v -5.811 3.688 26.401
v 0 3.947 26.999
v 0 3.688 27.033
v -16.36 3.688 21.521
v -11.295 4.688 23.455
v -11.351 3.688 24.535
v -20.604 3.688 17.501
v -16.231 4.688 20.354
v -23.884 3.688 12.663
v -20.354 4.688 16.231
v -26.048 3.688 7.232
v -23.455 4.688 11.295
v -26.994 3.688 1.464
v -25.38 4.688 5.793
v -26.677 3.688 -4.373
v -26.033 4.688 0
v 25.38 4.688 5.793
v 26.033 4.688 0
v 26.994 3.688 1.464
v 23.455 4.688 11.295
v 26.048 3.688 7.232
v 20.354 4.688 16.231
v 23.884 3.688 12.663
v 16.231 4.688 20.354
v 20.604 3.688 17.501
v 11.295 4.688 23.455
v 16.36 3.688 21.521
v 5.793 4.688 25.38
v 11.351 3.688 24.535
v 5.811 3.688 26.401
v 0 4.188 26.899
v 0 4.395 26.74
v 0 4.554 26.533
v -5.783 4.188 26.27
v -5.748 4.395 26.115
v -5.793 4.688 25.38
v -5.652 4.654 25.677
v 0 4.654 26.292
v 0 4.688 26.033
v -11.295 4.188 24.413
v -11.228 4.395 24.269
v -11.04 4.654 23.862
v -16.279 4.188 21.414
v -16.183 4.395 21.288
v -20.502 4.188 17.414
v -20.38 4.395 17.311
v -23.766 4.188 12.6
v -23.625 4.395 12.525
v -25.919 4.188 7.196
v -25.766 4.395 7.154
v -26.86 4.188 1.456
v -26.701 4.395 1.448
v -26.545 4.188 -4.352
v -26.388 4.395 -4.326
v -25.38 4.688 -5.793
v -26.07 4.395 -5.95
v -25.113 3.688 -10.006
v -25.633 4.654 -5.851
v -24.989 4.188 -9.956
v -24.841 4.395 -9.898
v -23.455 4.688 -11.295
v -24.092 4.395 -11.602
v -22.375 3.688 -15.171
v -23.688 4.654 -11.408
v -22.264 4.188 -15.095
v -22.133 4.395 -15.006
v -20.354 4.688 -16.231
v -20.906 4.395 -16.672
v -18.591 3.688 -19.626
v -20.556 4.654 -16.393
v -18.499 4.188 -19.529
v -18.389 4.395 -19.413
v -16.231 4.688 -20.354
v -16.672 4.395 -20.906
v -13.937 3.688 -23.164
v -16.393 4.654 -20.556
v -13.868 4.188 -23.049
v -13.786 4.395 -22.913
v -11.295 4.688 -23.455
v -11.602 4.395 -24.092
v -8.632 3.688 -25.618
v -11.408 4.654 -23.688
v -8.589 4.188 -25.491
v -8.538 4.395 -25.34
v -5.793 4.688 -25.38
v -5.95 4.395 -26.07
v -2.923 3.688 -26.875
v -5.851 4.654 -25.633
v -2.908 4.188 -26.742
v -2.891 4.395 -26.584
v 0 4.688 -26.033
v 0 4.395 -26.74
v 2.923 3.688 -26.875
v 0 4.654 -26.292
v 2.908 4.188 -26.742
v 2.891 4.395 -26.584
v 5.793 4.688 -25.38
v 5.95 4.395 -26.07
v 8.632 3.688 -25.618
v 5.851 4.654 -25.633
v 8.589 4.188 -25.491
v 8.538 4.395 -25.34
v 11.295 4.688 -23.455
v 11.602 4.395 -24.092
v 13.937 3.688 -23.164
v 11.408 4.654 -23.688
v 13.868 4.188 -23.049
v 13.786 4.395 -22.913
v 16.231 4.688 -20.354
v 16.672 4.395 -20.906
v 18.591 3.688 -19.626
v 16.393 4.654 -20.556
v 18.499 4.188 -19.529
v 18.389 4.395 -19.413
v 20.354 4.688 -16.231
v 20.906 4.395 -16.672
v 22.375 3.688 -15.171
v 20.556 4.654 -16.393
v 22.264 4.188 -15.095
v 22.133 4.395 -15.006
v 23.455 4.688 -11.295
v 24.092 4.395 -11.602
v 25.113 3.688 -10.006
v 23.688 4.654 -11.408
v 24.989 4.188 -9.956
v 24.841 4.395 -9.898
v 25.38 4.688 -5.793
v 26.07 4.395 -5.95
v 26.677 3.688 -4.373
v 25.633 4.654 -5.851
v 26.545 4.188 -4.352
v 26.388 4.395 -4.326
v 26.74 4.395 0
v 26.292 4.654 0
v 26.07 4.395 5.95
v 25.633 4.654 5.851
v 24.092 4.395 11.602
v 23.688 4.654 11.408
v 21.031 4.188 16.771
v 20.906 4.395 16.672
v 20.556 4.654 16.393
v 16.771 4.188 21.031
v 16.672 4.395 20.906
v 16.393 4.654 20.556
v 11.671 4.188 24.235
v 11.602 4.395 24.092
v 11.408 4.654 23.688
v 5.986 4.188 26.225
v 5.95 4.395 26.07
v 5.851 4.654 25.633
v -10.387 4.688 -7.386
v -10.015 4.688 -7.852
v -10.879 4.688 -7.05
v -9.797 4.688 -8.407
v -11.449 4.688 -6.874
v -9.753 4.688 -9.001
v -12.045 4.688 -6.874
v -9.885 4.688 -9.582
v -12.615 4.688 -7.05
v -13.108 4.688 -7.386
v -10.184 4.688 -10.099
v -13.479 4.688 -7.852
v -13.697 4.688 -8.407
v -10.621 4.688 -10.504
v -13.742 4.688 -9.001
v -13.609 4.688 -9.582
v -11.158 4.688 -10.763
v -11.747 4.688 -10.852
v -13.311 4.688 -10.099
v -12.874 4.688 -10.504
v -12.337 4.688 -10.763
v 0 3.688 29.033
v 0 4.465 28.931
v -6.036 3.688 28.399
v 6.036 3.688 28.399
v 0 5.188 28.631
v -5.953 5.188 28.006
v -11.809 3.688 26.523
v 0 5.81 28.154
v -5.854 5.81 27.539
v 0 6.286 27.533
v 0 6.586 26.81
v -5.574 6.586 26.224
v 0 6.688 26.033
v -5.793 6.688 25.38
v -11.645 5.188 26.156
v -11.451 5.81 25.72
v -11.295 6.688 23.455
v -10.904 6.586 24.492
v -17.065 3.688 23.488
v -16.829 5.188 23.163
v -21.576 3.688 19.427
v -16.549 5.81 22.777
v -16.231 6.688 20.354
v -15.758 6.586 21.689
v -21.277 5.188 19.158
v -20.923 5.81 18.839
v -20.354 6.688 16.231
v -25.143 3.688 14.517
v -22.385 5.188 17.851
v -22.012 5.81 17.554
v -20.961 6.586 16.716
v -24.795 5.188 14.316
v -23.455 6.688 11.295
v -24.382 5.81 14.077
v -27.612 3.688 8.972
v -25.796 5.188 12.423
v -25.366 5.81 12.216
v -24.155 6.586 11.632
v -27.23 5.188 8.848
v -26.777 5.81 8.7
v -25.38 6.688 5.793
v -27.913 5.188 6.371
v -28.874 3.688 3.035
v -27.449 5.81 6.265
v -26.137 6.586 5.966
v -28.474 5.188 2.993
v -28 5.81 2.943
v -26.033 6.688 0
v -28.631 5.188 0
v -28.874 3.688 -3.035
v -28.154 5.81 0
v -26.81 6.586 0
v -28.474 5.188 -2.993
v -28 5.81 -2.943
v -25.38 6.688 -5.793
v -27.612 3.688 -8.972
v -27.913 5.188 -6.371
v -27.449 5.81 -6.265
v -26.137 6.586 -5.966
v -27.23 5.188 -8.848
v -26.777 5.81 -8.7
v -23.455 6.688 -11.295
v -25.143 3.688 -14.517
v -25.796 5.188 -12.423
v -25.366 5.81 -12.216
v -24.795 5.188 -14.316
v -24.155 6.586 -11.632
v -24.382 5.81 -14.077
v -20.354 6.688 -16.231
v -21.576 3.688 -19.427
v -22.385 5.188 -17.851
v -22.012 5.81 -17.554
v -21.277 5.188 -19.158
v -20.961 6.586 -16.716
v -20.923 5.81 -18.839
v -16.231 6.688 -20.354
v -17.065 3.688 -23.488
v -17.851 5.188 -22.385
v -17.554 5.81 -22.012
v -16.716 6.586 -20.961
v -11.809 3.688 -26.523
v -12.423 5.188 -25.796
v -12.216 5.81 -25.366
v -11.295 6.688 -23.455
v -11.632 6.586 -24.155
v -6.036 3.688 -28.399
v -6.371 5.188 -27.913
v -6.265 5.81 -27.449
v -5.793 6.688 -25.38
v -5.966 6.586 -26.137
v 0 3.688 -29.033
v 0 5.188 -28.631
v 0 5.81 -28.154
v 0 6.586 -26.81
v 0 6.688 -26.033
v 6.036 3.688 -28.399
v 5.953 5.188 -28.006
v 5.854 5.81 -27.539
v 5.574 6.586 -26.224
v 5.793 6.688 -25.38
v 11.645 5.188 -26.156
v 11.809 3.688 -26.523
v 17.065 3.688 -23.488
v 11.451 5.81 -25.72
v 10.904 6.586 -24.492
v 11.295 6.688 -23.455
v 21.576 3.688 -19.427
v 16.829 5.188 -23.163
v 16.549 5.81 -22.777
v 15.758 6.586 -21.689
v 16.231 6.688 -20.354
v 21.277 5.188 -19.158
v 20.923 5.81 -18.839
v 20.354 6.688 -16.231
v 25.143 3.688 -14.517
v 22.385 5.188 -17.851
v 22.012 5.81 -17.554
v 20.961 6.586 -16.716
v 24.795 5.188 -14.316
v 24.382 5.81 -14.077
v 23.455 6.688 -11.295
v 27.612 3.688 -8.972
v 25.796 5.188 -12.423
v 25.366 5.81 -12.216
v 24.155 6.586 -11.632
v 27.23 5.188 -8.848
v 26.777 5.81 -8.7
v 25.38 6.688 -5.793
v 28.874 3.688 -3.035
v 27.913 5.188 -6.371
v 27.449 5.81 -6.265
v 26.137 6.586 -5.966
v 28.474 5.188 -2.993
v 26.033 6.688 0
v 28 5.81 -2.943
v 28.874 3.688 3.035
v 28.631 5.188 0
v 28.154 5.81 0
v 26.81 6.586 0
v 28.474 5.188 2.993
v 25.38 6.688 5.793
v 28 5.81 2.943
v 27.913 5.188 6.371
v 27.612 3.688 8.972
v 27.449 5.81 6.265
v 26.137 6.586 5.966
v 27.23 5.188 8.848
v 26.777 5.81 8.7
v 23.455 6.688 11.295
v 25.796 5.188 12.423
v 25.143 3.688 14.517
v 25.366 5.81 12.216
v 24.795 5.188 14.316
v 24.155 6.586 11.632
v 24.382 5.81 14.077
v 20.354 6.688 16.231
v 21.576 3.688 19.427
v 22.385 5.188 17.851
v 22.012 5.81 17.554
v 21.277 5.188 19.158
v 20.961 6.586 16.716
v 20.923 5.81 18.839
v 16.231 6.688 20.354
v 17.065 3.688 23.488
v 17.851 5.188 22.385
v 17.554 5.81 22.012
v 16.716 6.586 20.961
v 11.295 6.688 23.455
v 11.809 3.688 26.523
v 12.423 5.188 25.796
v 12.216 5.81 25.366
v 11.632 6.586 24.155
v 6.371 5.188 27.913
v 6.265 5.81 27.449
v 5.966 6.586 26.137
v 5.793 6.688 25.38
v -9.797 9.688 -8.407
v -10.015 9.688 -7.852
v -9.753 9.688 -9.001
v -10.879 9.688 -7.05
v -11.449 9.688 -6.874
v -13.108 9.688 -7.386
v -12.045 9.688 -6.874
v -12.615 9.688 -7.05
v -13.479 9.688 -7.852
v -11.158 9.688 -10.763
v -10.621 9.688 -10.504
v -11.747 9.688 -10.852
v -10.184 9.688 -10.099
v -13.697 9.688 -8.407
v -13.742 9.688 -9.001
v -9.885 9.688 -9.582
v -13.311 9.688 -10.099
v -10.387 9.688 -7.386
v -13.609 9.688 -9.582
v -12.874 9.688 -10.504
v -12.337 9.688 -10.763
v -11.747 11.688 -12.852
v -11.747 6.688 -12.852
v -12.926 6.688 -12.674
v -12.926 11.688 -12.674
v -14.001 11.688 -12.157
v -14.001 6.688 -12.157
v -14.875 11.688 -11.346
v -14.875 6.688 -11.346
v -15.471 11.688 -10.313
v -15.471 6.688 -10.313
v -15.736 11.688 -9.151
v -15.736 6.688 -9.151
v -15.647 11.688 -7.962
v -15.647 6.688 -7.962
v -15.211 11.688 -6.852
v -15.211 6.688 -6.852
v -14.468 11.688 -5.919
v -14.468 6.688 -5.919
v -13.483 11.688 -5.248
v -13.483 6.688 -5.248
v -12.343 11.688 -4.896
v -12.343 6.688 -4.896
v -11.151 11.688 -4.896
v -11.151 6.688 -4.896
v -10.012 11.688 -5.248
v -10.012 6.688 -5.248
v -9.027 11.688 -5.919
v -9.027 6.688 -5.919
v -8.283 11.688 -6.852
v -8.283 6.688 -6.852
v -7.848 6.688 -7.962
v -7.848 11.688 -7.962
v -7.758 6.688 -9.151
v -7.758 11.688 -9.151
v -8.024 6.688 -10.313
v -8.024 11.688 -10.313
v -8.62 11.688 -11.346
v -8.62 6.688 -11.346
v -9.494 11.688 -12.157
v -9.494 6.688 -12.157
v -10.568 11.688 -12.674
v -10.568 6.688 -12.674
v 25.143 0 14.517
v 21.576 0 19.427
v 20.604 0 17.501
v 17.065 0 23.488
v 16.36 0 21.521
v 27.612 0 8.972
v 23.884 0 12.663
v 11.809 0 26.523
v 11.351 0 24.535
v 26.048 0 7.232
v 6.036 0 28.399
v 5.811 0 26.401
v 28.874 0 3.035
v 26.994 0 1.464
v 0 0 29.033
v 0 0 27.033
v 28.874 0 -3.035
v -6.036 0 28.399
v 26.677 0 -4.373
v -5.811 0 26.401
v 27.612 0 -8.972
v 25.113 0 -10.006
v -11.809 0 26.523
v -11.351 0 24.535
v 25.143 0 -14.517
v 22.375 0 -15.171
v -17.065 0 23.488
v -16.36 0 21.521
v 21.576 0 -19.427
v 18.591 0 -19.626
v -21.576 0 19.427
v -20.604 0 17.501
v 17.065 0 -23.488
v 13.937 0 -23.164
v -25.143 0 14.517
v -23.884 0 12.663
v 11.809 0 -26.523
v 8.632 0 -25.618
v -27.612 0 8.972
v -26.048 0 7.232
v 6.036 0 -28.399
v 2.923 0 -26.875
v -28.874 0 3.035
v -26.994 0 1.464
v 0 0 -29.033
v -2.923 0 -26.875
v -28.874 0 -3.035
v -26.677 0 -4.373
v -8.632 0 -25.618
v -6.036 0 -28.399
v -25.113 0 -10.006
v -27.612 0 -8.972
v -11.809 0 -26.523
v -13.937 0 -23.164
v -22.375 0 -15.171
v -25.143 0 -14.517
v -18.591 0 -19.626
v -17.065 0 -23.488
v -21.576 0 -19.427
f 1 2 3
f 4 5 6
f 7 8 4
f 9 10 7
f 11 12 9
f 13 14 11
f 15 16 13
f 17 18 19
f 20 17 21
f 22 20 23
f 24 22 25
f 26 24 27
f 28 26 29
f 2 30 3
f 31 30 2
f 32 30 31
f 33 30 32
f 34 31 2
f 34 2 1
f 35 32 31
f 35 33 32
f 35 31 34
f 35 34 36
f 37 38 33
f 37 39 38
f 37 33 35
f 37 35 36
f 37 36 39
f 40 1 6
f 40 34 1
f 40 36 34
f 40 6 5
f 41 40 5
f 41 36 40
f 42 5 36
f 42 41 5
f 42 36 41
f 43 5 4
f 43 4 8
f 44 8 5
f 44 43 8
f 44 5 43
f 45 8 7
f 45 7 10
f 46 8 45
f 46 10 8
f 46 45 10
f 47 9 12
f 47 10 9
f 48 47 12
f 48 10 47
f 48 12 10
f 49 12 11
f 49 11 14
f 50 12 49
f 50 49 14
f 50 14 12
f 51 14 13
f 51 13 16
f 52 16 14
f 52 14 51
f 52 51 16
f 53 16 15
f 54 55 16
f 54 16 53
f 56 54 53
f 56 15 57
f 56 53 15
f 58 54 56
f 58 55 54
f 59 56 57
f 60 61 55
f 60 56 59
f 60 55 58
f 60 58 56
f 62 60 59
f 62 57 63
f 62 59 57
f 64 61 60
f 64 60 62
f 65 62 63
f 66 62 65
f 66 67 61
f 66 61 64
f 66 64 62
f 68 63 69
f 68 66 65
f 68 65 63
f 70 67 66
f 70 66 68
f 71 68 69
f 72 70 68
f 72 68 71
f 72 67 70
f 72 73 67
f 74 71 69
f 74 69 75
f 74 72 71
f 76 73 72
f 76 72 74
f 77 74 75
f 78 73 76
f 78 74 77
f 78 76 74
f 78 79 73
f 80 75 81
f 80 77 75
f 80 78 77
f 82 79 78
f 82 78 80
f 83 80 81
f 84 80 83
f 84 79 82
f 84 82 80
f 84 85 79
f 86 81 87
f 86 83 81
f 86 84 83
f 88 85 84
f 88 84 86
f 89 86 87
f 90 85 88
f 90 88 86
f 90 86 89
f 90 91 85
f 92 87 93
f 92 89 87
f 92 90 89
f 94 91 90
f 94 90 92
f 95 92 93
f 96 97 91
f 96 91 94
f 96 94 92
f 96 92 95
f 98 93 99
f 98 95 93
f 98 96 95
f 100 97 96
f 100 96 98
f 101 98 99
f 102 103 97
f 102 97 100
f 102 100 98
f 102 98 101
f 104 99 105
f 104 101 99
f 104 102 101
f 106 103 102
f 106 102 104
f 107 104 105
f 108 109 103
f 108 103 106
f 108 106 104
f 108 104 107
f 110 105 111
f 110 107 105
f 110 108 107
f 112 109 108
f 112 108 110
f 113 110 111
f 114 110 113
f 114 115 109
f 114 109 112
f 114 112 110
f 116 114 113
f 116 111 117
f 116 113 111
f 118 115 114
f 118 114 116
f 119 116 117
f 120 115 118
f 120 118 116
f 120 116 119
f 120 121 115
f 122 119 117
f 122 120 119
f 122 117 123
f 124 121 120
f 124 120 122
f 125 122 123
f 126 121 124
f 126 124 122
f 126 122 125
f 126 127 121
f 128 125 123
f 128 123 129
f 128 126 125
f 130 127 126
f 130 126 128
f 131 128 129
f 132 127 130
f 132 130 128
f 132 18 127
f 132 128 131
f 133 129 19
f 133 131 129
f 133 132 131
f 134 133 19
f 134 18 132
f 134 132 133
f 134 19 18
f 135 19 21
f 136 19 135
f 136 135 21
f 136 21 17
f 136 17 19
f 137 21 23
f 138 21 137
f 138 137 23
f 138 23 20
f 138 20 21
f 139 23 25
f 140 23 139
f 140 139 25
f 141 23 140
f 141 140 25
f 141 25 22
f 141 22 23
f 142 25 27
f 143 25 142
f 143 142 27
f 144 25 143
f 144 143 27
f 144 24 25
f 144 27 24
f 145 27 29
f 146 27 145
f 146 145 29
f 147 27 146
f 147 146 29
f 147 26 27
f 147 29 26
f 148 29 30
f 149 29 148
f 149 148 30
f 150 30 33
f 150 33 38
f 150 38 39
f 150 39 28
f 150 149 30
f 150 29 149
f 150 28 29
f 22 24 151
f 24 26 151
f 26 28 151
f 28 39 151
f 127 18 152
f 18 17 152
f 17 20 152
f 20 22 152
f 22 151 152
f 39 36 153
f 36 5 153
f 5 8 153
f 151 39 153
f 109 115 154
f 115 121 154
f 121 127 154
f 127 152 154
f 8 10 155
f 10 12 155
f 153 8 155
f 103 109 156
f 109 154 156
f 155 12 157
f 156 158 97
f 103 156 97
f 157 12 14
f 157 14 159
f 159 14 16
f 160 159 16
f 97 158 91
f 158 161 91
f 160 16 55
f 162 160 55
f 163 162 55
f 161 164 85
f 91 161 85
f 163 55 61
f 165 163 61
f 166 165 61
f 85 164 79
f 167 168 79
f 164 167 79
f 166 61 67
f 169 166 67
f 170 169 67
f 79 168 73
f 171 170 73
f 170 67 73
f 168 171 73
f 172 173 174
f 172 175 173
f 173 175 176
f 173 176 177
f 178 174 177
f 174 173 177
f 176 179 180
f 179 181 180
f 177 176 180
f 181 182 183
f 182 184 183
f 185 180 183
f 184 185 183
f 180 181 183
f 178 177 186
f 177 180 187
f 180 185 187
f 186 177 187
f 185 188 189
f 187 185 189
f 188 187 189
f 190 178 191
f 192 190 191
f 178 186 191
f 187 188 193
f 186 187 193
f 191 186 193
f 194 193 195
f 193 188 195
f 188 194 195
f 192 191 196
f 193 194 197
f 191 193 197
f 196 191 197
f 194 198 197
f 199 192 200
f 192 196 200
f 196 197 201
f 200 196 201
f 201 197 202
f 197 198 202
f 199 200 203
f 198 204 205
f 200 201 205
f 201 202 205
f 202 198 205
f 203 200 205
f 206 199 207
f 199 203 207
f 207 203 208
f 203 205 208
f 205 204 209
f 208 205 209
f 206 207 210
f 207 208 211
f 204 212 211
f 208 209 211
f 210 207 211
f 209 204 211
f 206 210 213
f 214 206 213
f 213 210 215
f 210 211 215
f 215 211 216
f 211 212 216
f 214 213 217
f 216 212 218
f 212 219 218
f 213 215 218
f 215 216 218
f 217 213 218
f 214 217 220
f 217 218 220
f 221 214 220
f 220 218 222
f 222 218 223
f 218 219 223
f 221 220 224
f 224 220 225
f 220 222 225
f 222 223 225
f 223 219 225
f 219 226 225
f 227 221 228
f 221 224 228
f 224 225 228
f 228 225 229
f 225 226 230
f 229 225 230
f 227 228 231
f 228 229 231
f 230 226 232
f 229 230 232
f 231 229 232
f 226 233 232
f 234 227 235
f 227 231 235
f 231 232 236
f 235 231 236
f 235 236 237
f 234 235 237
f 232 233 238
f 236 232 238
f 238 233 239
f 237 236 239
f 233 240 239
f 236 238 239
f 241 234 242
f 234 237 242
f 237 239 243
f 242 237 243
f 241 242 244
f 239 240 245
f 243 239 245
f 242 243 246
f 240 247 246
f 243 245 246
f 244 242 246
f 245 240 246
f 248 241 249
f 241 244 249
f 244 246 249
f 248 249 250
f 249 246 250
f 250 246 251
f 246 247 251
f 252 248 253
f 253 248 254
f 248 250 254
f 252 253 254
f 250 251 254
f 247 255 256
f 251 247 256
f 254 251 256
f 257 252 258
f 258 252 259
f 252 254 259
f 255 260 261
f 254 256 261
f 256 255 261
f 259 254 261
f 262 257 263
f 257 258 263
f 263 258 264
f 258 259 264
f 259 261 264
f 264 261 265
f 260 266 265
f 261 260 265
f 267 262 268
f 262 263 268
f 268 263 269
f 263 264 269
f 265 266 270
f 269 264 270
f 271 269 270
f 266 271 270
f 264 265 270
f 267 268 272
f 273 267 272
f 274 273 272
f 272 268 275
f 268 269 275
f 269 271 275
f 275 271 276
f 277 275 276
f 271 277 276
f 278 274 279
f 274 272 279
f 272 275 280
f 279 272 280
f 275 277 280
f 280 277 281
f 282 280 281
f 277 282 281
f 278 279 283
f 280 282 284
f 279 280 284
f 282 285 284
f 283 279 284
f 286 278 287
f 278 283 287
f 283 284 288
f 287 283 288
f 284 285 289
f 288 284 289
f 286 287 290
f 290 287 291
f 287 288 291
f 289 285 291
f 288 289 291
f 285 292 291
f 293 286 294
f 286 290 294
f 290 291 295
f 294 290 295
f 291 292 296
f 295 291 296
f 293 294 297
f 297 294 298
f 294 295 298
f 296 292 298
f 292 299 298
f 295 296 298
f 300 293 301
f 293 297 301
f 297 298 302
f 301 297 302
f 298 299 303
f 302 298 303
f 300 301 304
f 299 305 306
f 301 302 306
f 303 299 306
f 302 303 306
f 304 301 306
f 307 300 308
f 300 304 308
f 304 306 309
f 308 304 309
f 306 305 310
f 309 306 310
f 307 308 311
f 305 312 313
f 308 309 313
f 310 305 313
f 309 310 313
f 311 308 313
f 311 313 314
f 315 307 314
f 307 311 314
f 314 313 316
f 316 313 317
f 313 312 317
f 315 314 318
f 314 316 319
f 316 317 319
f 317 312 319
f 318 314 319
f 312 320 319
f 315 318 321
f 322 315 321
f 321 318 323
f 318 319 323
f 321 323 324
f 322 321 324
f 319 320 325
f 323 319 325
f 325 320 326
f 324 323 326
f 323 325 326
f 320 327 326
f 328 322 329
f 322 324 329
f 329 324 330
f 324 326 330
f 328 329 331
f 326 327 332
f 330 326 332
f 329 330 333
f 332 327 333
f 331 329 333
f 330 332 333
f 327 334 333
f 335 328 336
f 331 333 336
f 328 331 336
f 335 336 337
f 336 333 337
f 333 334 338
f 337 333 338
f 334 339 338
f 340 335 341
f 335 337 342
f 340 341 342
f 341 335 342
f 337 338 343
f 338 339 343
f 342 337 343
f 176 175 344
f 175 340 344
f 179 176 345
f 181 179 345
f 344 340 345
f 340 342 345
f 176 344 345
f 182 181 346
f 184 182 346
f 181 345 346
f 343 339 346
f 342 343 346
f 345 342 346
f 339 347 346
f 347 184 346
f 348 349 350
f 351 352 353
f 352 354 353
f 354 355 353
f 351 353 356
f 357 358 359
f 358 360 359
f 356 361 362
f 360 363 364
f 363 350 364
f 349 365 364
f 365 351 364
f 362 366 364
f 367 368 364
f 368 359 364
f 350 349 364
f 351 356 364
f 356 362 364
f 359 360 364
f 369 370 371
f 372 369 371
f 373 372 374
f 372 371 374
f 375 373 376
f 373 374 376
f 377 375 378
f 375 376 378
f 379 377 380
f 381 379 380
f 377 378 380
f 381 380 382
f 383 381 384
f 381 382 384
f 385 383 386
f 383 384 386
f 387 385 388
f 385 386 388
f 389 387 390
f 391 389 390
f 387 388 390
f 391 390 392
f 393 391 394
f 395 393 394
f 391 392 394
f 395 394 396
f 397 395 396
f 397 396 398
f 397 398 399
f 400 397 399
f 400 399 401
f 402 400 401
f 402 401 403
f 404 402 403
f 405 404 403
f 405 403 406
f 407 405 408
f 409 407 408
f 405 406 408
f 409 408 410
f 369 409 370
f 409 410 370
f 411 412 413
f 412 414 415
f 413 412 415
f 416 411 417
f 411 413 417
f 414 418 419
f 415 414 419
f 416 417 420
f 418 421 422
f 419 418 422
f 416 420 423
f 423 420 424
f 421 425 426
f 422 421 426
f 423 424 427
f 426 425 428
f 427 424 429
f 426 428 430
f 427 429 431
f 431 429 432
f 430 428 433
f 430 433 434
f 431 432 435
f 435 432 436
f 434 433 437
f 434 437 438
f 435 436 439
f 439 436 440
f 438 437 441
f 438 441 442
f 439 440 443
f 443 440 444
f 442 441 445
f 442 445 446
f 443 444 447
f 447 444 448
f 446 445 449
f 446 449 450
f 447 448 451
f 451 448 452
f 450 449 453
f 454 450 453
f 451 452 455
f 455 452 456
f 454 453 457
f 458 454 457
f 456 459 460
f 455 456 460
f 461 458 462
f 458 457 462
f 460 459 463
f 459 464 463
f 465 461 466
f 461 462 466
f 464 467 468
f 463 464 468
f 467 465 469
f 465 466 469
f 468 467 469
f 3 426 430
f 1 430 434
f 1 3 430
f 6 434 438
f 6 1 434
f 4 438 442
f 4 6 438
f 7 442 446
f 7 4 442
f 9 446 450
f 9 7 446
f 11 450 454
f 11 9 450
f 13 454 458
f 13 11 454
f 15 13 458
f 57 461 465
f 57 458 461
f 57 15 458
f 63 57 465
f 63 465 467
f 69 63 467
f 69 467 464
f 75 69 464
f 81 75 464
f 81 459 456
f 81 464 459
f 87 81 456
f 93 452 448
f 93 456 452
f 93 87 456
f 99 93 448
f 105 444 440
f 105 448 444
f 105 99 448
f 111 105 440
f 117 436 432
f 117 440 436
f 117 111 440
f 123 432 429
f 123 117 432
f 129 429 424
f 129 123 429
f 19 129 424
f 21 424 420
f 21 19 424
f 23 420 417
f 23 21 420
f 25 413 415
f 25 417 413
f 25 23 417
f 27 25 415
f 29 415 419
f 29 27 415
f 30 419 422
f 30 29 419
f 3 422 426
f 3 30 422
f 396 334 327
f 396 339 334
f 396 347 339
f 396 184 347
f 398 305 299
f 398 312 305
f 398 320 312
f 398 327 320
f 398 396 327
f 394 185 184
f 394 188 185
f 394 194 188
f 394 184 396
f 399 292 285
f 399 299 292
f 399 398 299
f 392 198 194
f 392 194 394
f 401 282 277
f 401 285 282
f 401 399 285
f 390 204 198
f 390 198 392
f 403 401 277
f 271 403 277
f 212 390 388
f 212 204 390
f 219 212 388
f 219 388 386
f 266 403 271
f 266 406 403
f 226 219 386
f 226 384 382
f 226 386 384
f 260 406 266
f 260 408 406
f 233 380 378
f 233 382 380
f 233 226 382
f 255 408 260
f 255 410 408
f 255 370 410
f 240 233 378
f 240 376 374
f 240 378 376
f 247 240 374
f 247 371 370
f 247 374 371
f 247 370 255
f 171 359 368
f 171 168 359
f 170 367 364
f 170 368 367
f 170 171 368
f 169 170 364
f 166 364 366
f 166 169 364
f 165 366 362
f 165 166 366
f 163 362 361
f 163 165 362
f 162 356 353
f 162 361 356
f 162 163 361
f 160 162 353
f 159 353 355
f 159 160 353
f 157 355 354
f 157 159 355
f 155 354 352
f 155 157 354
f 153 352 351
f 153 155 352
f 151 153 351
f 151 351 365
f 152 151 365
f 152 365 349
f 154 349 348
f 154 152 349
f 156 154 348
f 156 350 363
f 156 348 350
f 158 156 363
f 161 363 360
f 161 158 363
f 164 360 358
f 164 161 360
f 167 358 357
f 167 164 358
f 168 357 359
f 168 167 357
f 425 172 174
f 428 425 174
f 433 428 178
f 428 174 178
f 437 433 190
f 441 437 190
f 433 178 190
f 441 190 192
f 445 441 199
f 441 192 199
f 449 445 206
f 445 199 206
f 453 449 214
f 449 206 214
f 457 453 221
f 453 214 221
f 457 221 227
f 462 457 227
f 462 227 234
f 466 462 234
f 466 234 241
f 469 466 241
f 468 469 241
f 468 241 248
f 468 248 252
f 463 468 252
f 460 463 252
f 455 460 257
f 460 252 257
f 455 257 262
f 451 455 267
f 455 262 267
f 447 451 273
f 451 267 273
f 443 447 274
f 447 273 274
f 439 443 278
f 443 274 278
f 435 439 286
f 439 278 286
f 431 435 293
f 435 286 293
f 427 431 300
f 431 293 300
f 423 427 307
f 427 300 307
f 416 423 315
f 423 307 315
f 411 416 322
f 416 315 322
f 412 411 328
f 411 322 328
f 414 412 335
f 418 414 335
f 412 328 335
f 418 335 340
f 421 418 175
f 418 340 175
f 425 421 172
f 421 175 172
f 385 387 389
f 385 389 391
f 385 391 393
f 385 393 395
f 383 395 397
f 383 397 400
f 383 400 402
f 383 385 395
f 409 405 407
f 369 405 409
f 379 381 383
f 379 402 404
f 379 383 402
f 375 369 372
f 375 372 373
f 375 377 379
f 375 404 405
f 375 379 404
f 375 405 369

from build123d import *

# Parameters (mm, degrees)
SKETCH_1_W      = 29.03316099
SKETCH_1_H      = 6.688317385
FILLET_1_R      = 3
SKETCH_2_R      = 4
EXTRUDE_1_DEPTH = 5
SHELL_1_T       = -2


with BuildPart() as part:
    # 草图1 → 旋转1 (revolve)
    with BuildSketch(Plane.XY, mode=Mode.PRIVATE) as revolve_1_sk:
        with Locations((14.516580495, 3.344158693)):
            Rectangle(SKETCH_1_W, SKETCH_1_H)
    revolve(revolve_1_sk.sketch.rotate(Axis((0, 6.688317385, 0), (0, -1, 0)), 90), axis=Axis((0, 6.688317385, 0), (0, -1, 0)))

    # 圆角1
    fillet_1_edges = [part.edges().sort_by_distance(p)[0] for p in [
        (0, 6.688317385, -29.03316099),
    ]]
    fillet(fillet_1_edges, radius=FILLET_1_R)

    # 草图2 → 凸台-拉伸1 (add)
    with BuildSketch(Plane(origin=(0, 6.688317385, 0), x_dir=(1, 0, 0), z_dir=(0, 1, 0))):
        with Locations(Location((-11.747239152, 8.851672142, 0), (0, 0, 90))):
            Circle(SKETCH_2_R)
    extrude(amount=EXTRUDE_1_DEPTH)

    # 抽壳1
    shell_1_openings = [part.faces().sort_by_distance(p)[0] for p in [
        (0, 0, 0),
    ]]
    offset(amount=SHELL_1_T, openings=shell_1_openings, kind=Kind.INTERSECTION)


solid = part.part
